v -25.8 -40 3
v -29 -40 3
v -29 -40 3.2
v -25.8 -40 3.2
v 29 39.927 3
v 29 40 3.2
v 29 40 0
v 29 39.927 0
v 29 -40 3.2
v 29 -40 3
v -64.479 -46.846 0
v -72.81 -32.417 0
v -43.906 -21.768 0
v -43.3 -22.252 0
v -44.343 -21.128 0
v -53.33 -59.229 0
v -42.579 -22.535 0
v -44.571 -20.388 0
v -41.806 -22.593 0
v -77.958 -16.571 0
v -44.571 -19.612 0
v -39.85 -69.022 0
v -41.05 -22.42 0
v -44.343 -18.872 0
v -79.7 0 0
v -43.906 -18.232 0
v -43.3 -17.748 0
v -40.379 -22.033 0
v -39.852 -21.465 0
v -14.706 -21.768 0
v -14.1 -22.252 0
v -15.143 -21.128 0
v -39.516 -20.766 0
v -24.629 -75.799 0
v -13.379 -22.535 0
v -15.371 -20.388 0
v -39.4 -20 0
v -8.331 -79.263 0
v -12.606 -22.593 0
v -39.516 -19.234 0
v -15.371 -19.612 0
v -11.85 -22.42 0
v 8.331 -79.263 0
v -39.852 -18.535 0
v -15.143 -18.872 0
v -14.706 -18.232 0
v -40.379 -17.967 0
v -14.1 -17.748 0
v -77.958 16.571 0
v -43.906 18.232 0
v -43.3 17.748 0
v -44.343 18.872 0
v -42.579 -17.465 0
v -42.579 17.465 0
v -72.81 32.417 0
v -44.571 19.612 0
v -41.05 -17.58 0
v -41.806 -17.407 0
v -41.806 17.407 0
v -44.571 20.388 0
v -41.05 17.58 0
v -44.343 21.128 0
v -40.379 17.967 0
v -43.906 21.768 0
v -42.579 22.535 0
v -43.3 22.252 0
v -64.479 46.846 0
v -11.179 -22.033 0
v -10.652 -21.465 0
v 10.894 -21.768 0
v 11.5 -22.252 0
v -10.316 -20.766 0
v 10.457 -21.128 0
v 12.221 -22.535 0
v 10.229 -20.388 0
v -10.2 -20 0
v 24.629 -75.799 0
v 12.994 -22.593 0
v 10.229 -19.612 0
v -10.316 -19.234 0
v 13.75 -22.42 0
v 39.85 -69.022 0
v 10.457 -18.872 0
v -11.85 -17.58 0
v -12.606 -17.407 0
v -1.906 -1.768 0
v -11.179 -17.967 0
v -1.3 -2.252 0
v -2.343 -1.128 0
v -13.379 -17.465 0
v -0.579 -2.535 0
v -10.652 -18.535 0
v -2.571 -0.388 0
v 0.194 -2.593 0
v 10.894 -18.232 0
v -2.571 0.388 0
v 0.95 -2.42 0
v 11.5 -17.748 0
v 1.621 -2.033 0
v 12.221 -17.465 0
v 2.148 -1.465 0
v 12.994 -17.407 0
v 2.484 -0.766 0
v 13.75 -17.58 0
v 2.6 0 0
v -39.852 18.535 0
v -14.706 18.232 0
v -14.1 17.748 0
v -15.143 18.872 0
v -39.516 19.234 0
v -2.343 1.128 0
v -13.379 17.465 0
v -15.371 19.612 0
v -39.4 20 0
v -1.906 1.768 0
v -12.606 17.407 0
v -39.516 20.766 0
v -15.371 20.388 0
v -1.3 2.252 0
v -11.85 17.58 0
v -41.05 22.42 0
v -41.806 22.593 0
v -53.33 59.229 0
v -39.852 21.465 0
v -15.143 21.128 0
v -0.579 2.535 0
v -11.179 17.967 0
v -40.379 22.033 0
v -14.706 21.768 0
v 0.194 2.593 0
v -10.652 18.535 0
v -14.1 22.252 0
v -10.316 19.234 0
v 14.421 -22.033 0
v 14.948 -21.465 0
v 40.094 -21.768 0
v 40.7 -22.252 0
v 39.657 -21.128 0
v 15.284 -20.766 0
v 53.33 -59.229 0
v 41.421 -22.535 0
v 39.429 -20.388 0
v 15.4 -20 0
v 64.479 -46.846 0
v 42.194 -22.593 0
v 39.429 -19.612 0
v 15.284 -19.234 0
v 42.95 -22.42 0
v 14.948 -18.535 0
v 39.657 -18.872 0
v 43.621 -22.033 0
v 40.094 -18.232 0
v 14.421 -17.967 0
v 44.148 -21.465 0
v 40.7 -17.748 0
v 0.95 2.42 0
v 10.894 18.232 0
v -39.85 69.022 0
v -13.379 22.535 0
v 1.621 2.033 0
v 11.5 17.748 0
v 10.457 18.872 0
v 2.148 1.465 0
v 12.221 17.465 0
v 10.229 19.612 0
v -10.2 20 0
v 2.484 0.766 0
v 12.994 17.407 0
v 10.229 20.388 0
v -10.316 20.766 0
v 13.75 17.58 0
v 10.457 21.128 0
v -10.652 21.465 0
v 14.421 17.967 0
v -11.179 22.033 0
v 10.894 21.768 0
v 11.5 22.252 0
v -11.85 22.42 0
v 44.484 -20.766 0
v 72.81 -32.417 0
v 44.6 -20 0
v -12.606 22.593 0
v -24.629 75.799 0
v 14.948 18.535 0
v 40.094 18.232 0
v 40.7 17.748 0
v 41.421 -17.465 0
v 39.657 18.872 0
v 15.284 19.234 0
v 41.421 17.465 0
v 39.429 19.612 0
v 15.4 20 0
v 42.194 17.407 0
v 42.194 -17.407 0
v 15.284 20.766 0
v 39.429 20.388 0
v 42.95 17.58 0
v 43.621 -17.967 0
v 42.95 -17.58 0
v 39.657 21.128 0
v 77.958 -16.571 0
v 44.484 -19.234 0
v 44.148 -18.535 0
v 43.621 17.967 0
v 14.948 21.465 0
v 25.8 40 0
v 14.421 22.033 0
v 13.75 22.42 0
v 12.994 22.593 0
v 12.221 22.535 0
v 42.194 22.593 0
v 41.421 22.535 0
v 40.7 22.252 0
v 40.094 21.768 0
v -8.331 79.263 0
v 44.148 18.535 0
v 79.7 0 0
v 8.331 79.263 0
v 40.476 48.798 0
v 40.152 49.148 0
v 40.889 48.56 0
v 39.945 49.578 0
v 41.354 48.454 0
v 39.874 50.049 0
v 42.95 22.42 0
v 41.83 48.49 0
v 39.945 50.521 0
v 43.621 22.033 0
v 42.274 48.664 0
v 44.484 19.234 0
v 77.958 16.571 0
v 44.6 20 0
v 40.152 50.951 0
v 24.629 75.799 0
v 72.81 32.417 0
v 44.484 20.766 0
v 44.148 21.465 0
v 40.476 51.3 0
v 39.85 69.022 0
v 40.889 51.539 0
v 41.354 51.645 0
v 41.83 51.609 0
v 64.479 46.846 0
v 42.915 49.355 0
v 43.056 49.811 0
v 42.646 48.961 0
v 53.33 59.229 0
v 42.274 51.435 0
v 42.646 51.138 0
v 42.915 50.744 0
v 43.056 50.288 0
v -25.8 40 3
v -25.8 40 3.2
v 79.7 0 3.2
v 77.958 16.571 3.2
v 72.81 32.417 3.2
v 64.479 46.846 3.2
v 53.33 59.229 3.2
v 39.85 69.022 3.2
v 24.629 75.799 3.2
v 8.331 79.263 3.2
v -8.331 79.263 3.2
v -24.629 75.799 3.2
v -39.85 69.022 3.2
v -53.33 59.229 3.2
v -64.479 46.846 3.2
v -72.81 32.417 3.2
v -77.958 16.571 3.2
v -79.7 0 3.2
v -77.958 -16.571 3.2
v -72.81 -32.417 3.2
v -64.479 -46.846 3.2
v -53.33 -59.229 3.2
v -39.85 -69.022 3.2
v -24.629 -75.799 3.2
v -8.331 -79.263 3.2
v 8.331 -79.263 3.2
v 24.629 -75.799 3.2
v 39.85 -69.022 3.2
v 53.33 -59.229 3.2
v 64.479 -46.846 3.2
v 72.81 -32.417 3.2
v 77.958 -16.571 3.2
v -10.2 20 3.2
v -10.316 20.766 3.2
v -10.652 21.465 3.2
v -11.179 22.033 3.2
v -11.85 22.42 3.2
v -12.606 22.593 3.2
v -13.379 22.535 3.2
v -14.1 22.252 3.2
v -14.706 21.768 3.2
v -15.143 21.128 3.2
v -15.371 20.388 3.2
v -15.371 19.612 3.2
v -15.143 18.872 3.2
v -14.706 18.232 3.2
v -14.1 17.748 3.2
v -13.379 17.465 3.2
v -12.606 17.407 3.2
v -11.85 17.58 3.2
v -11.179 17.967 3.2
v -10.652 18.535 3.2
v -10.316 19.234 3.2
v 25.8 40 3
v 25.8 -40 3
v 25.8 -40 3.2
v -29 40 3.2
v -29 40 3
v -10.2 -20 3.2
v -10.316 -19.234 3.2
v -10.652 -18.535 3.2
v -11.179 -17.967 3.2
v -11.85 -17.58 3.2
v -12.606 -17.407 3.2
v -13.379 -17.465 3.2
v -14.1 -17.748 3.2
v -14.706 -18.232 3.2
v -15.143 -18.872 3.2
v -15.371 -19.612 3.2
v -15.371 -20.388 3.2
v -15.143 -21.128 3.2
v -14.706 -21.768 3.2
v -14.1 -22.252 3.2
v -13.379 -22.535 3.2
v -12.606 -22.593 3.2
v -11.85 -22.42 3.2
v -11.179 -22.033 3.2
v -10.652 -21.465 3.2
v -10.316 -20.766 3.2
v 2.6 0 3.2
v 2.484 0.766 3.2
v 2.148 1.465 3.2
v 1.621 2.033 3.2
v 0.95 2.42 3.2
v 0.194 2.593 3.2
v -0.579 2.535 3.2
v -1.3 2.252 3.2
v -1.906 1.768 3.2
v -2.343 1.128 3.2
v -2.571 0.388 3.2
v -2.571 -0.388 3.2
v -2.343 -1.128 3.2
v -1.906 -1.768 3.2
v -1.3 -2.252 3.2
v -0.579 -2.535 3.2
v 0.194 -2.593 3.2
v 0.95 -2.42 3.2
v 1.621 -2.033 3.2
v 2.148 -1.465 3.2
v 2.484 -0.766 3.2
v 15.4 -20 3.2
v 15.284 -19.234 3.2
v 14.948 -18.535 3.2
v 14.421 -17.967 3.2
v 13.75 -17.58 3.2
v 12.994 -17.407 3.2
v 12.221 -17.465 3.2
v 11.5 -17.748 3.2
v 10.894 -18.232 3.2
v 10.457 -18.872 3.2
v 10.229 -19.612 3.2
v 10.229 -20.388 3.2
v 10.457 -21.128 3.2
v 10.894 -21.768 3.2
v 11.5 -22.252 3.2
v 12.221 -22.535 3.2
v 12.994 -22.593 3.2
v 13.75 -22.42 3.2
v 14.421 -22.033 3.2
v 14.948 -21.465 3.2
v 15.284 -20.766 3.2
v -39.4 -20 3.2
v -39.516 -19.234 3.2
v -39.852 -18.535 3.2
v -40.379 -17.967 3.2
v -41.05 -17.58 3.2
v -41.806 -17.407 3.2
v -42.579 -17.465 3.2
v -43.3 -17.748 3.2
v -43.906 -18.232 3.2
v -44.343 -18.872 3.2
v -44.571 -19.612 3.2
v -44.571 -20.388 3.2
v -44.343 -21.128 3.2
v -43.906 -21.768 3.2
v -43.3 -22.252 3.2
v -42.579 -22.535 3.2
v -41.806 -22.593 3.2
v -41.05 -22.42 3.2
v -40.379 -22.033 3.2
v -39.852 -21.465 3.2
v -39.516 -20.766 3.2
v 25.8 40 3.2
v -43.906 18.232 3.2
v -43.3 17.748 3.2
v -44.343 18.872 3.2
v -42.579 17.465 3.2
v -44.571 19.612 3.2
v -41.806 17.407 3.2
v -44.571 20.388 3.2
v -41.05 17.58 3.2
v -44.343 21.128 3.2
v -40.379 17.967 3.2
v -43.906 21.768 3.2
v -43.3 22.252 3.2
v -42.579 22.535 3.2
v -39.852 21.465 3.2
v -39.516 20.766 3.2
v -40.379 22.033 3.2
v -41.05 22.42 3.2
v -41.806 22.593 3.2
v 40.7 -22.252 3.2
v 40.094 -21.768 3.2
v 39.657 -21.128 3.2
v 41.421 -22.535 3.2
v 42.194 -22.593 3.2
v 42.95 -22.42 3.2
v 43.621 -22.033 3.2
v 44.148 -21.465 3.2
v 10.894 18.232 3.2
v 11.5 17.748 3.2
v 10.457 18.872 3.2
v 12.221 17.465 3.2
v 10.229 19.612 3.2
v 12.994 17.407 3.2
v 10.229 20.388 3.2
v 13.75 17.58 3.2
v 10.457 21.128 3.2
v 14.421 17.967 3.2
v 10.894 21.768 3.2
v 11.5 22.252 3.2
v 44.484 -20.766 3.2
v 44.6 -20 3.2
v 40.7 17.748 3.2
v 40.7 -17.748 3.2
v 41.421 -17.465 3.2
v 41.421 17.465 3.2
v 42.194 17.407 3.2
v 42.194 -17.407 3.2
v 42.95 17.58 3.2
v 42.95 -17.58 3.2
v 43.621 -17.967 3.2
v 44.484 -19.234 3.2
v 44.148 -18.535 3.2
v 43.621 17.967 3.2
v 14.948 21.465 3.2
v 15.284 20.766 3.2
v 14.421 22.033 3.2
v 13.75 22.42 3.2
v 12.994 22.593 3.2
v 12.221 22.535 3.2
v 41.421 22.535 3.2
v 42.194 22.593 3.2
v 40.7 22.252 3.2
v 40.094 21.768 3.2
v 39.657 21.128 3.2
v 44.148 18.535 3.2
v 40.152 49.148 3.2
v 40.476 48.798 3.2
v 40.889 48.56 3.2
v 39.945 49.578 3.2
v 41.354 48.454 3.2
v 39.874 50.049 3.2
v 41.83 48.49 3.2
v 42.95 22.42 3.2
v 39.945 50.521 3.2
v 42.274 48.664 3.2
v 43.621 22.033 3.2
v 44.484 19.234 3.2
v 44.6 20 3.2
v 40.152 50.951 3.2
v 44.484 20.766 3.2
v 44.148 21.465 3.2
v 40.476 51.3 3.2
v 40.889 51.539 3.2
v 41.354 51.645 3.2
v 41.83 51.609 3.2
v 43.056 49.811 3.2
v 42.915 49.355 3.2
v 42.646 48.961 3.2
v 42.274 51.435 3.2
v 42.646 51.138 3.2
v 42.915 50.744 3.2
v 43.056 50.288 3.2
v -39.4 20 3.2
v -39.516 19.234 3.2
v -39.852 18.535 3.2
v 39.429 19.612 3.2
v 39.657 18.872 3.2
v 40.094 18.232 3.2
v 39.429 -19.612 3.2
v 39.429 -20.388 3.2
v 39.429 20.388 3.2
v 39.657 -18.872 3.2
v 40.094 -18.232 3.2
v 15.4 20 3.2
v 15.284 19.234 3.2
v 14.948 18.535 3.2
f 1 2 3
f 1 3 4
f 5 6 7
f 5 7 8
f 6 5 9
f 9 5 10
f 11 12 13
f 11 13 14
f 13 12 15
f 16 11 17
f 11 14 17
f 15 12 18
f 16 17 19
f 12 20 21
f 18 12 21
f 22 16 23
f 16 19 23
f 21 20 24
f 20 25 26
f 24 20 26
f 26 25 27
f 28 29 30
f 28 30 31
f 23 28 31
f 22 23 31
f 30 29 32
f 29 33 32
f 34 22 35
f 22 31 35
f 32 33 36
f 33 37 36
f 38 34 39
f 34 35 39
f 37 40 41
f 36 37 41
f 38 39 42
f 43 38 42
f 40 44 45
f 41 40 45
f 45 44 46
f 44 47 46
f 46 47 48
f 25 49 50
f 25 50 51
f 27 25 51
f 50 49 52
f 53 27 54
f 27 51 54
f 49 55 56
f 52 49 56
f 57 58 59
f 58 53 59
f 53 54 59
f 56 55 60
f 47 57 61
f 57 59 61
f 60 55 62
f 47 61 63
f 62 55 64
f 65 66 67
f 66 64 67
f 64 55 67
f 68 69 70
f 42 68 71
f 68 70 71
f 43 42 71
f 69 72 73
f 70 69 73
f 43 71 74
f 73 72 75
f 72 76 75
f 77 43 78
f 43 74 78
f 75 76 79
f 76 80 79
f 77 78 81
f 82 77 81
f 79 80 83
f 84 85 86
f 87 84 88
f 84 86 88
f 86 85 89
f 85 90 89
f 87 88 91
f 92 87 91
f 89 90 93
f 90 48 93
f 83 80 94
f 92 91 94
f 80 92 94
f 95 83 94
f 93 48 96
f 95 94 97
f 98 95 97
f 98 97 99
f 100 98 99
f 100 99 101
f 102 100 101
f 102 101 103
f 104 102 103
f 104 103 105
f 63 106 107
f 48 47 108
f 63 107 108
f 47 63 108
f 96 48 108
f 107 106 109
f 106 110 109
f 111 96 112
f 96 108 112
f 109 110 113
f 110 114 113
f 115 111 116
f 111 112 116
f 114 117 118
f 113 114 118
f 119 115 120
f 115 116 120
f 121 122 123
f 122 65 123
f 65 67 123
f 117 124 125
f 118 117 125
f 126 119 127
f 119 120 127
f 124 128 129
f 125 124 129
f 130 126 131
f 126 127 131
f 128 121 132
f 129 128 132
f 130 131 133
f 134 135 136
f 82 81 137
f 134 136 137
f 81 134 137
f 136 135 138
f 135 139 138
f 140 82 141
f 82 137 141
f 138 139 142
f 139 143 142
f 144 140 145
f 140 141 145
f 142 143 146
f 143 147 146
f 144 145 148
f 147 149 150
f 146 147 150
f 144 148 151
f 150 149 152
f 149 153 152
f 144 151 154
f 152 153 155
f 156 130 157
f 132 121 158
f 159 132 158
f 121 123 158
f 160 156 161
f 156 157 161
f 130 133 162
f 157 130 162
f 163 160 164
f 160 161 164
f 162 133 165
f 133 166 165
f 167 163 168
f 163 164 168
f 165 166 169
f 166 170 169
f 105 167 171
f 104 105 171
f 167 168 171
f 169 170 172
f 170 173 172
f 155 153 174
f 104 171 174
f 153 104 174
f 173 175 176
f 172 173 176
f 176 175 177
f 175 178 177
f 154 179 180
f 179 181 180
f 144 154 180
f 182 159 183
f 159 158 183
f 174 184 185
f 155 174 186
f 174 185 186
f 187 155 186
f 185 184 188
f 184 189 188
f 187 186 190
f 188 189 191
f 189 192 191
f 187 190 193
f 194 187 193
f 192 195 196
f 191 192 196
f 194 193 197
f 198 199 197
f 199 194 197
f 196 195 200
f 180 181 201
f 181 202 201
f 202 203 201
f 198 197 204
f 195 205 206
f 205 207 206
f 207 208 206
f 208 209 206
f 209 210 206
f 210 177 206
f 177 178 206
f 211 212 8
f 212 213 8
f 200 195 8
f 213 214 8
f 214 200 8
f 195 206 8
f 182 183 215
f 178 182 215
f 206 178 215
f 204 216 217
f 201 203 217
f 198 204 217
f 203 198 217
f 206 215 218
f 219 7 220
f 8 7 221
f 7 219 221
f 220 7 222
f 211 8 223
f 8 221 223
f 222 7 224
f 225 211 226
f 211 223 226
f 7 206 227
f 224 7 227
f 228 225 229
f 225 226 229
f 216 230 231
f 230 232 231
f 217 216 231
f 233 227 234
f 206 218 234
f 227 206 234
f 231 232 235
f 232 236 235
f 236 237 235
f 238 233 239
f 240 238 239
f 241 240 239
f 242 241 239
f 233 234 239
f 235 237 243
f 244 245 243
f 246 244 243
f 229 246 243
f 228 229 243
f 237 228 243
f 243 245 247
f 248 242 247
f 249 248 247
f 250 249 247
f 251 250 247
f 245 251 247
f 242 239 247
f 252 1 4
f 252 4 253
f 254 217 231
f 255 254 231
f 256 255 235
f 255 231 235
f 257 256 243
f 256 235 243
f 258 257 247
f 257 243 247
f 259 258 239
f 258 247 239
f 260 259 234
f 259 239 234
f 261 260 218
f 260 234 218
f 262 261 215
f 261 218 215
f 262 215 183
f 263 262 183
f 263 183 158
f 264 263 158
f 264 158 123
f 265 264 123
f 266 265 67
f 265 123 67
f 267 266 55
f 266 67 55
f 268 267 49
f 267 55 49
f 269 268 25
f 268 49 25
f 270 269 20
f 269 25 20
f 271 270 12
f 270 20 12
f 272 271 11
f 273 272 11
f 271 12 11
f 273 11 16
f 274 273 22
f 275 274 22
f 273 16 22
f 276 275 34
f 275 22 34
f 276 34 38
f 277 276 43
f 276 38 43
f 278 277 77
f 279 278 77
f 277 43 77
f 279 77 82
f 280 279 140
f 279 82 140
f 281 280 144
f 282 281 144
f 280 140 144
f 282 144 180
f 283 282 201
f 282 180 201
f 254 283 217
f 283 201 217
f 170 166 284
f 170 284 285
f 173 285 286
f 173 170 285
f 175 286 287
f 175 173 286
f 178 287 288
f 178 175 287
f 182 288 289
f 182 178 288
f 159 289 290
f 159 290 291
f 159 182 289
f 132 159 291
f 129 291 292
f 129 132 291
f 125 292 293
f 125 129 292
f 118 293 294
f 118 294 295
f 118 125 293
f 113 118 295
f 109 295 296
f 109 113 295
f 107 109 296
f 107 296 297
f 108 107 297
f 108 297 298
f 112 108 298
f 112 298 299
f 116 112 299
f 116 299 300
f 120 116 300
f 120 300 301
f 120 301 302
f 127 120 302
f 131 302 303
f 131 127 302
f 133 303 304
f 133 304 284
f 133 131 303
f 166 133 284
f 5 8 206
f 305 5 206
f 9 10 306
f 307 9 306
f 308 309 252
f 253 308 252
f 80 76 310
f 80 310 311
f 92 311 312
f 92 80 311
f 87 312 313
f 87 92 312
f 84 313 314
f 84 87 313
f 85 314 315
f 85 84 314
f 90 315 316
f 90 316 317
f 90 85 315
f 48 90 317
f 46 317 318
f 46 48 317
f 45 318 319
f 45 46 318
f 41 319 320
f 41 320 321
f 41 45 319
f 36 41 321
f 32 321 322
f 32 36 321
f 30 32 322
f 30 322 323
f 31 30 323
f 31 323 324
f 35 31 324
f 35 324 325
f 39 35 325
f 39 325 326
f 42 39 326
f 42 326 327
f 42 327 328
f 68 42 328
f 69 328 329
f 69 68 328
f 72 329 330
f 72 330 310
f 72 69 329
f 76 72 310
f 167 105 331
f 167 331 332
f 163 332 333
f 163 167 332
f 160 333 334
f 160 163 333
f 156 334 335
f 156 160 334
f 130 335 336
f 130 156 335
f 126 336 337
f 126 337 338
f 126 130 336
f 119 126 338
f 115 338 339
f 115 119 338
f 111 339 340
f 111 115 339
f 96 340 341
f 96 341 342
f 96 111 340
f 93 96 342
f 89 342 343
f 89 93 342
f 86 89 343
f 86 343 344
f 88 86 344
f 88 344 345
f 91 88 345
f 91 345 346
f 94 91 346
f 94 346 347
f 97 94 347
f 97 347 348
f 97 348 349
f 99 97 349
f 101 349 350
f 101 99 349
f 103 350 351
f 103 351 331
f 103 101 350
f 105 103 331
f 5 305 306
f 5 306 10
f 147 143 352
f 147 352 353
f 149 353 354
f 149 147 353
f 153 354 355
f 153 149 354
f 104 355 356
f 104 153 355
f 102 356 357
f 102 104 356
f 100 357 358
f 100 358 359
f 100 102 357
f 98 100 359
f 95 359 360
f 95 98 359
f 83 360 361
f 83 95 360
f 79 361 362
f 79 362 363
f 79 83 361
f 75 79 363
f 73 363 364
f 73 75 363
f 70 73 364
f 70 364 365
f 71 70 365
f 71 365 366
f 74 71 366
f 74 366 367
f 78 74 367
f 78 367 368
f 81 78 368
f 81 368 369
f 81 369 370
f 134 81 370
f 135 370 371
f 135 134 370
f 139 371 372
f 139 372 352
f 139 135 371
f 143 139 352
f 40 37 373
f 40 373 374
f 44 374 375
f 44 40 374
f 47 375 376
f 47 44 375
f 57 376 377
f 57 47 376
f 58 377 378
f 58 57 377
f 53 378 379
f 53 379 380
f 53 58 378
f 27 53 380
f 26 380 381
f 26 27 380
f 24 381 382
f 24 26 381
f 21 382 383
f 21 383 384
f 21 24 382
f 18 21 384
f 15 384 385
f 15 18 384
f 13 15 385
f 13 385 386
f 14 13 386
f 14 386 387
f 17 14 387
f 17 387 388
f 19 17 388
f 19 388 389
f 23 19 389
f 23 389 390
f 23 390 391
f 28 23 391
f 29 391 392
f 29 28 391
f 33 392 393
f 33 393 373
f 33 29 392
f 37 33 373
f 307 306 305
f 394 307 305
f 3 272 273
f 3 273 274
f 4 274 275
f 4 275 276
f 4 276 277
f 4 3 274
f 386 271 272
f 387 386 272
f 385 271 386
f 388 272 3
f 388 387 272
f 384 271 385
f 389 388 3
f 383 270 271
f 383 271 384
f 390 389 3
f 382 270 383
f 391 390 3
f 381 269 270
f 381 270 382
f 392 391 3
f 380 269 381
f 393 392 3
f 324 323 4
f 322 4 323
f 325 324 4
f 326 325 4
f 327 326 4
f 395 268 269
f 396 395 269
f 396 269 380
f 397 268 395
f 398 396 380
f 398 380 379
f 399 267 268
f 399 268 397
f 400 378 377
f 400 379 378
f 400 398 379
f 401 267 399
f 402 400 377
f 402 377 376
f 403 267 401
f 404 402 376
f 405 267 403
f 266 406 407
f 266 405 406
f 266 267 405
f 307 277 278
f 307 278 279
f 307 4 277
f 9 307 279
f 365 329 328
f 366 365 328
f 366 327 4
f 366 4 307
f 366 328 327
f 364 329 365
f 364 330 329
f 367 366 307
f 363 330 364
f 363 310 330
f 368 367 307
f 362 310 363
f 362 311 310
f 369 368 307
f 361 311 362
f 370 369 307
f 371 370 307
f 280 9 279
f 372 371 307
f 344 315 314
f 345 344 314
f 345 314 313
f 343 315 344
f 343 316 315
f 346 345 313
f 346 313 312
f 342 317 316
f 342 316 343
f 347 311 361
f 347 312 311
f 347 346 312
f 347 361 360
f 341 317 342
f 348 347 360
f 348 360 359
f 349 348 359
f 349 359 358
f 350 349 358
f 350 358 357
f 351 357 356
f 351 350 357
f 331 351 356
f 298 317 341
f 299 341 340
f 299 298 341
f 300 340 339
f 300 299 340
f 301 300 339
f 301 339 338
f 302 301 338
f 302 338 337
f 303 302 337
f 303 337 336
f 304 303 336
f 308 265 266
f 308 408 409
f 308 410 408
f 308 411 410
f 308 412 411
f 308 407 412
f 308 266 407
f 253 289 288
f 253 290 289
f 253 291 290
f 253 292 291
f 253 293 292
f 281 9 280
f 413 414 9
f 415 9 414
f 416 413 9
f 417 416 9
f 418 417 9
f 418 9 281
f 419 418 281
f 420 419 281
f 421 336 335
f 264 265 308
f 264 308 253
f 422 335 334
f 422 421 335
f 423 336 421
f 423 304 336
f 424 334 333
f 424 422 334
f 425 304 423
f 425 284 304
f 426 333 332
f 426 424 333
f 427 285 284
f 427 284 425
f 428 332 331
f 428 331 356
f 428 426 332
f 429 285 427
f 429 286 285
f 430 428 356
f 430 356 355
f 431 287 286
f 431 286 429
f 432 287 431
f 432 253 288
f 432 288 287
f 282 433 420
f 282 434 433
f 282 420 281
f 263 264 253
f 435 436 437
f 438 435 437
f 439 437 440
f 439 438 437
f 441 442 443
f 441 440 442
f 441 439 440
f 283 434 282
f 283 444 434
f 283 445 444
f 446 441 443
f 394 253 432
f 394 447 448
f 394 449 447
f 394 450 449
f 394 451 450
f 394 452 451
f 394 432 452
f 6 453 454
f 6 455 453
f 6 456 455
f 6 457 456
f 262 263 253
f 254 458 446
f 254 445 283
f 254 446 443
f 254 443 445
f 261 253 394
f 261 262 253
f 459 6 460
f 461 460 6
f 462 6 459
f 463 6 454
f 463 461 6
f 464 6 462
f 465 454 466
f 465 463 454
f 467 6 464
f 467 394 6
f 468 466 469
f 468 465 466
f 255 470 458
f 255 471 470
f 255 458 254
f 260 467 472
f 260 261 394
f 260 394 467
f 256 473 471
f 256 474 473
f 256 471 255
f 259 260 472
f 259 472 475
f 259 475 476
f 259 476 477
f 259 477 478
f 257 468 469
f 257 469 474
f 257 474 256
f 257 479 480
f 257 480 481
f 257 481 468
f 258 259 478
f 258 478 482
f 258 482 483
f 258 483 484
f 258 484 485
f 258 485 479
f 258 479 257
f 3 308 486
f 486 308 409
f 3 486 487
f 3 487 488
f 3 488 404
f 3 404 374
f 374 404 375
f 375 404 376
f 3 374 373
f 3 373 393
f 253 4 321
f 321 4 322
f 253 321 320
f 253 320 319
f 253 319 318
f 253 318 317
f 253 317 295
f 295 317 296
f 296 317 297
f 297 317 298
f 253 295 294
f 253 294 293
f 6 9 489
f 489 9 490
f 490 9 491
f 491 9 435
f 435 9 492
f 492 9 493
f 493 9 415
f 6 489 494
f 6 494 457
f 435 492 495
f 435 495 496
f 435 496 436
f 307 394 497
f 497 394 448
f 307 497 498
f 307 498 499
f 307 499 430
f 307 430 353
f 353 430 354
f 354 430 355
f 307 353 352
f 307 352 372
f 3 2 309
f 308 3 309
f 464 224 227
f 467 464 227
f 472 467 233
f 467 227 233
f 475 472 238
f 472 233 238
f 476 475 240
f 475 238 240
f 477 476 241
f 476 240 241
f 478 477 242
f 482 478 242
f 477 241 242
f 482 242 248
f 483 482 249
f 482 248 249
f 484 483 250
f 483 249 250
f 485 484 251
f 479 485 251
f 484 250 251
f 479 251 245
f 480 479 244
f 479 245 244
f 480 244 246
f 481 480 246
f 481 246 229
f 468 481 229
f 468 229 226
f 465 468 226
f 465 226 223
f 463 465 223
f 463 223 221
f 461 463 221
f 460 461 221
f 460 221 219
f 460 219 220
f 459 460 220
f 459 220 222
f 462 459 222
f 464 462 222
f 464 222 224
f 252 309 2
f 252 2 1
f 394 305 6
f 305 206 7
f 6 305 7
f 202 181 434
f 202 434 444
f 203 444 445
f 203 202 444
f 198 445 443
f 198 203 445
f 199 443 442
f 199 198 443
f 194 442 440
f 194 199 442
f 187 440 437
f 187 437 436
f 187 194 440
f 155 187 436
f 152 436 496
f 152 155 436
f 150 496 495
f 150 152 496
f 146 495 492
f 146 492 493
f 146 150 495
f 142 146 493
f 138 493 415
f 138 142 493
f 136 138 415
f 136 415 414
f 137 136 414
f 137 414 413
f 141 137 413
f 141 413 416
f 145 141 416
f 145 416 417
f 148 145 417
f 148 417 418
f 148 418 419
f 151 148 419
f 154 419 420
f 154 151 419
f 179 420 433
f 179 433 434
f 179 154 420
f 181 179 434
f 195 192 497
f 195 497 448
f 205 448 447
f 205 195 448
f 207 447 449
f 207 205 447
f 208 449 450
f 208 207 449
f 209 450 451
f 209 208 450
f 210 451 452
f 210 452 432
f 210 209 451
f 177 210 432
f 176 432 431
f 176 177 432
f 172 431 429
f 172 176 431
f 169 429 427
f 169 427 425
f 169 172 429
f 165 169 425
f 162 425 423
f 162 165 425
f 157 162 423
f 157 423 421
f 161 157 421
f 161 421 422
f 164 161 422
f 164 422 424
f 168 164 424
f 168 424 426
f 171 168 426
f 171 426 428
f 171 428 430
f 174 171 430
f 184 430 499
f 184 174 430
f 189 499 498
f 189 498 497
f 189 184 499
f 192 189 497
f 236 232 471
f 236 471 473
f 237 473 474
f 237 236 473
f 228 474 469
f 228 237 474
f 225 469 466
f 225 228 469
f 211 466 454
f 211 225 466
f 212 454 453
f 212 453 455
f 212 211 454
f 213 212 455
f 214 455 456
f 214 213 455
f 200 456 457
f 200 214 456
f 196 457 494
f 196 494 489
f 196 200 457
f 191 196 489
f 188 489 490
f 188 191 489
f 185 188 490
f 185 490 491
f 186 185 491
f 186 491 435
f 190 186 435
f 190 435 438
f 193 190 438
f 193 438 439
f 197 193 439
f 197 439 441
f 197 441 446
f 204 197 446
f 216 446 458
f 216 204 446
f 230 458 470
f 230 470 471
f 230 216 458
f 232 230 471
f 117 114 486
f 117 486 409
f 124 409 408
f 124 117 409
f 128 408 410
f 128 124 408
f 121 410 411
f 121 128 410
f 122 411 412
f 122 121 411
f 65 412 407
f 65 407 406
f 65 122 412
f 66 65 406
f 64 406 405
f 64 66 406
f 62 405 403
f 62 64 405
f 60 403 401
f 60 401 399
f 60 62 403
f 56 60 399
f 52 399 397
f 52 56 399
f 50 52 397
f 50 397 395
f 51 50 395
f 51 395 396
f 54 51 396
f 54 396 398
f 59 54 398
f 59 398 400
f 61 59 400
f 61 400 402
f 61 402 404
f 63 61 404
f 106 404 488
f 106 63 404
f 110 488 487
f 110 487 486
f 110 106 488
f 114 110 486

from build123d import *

# Parameters (mm, degrees)
F0_W     = 3.2
F0_H     = 80
F0_R     = 79.7
F0_R_2   = 2.6
F1_DEPTH = 3.2
F2_DEPTH = 3
F4_D     = 3.2
F4_DEPTH = 3.2


with BuildPart() as f1:
    # F0 (on Top) → F1 (new body)
    with BuildSketch(Plane.XY):
        with Locations((-27.4, 0)):
            Rectangle(F0_W, F0_H)
        Polygon((25.8, 40), (25.8, -40), (29, -40), (29, 39.927304), align=None)
        Circle(F0_R)
        with Locations((-42, -20)):
            Circle(F0_R_2, mode=Mode.SUBTRACT)
        with Locations((-12.8, -20)):
            Circle(F0_R_2, mode=Mode.SUBTRACT)
        with Locations((12.8, -20)):
            Circle(F0_R_2, mode=Mode.SUBTRACT)
        with Locations((42, -20)):
            Circle(F0_R_2, mode=Mode.SUBTRACT)
        with Locations((-42, 20)):
            Circle(F0_R_2, mode=Mode.SUBTRACT)
        with Locations((-27.4, 0)):
            Rectangle(F0_W, F0_H, mode=Mode.SUBTRACT)
        with Locations((-12.8, 20)):
            Circle(F0_R_2, mode=Mode.SUBTRACT)
        Circle(F0_R_2, mode=Mode.SUBTRACT)
        Polygon((29, -40), (25.8, -40), (25.8, 40), (29, 40), (29, 39.927304), align=None, mode=Mode.SUBTRACT)
        with Locations((12.8, 20)):
            Circle(F0_R_2, mode=Mode.SUBTRACT)
        with Locations((42, 20)):
            Circle(F0_R_2, mode=Mode.SUBTRACT)
    extrude(amount=F1_DEPTH)

    # F0 (on Top) → F2 (join)
    with BuildSketch(Plane.XY):
        with Locations((-27.4, 0)):
            Rectangle(F0_W, F0_H)
        Polygon((25.8, 40), (25.8, -40), (29, -40), (29, 39.927304), align=None)
    extrude(amount=F2_DEPTH)

    # F4
    with Locations(Plane.XY.offset(3.2)):
        with Locations((41.473566, 50.049408)):
            Hole(F4_D / 2, depth=F4_DEPTH)


solid = f1.part
